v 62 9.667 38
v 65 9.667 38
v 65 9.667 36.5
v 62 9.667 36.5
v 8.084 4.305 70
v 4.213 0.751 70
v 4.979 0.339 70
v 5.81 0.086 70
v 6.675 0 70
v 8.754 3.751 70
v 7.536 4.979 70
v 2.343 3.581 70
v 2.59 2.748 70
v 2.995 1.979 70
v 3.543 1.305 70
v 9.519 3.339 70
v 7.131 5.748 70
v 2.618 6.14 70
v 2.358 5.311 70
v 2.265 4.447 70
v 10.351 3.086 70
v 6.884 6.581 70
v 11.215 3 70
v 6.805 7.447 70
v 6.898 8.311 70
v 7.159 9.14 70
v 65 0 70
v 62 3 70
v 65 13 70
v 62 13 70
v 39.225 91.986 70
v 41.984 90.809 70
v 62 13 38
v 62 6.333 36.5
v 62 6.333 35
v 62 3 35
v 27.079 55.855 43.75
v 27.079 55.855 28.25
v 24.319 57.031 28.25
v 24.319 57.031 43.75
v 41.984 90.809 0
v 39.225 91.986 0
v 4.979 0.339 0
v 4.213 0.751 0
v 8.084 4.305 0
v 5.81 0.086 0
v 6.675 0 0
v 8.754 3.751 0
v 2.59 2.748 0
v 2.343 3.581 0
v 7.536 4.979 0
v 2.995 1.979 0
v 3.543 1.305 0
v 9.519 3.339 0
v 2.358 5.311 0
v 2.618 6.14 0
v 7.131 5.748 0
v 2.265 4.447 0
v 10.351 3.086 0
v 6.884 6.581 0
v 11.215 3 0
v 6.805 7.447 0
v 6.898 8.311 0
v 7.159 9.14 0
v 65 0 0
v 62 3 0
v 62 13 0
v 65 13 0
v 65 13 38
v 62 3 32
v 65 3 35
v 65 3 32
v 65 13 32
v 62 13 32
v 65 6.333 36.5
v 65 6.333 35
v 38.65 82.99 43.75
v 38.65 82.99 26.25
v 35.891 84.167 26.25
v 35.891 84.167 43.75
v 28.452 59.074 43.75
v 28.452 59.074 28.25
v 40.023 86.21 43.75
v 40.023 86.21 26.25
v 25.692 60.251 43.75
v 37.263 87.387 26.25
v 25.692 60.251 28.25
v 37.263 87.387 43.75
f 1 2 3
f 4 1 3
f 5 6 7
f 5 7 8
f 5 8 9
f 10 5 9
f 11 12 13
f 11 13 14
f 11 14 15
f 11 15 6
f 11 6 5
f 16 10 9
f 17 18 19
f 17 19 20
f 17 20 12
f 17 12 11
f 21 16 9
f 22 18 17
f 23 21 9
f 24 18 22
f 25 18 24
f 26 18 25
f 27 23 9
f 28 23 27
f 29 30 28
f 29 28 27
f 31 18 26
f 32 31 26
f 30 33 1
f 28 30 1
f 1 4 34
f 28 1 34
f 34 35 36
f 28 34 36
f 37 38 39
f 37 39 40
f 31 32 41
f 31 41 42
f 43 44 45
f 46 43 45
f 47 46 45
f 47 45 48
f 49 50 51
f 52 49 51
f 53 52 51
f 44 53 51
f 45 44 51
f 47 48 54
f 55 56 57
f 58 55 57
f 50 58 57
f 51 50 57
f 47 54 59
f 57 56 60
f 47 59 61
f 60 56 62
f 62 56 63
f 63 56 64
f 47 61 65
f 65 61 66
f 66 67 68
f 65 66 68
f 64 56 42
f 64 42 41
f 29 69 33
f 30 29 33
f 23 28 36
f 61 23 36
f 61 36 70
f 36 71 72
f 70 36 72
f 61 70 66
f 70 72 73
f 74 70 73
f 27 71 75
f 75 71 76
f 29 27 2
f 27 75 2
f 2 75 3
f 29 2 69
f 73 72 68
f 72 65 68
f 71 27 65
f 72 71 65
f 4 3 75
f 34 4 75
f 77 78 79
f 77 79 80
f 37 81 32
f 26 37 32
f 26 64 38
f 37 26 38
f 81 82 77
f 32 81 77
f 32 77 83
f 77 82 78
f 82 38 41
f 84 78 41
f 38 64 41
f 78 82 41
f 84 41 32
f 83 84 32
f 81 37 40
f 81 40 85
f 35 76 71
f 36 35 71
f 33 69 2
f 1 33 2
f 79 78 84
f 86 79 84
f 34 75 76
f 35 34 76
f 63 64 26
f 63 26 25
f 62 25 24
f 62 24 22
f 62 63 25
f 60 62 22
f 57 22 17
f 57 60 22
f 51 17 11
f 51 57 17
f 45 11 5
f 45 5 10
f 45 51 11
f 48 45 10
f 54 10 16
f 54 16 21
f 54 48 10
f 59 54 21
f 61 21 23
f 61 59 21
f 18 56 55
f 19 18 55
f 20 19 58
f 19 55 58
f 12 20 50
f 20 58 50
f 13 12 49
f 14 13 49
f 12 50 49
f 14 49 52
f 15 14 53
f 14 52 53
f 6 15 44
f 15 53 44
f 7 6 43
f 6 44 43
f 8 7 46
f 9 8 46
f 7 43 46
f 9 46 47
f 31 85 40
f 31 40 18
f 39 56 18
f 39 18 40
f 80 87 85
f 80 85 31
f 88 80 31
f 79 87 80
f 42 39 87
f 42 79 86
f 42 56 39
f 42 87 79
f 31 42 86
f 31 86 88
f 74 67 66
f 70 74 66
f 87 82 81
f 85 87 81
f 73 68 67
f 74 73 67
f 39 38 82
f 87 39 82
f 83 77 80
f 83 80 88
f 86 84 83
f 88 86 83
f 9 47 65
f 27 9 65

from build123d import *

# Parameters (mm, degrees)
PAD_DEPTH       = 70
SKETCH001_W     = 3.5
SKETCH001_H     = 17.5
SKETCH001_H_2   = 15.5
POCKET_DEPTH    = 36.998994
POCKET001_DEPTH = 5


with BuildPart() as part:
    # Sketch → Pad (new body)
    with BuildSketch(Plane.XY):
        with BuildLine():
            Line((6.674721, 0), (65, 0))
            Line((65, 0), (65, 3))
            Line((65, 3), (65, 13))
            Line((65, 13), (62, 13))
            Line((62, 13), (62, 3))
            Line((62, 3), (11.215347, 3))
            ThreePointArc((7.158765, 9.139809), (7.535908, 4.978987), (11.215347, 3))
            Line((7.158765, 9.139809), (41.984267, 90.809258))
            Line((41.984267, 90.809258), (39.224687, 91.985998))
            Line((2.618138, 6.139809), (39.224687, 91.985998))
            ThreePointArc((2.618138, 6.139809), (2.995281, 1.978987), (6.674721, 0))
        make_face()
    extrude(amount=PAD_DEPTH)

    # Sketch001 (on Face9 of Pad) → Pocket (cut, through all)
    with BuildSketch(Plane(origin=(2.75958, -1.176741, 0), x_dir=(0.392247, 0.91986, 0), z_dir=(0.91986, -0.392247, 0))):
        with Locations((93.25, 35)):
            Rectangle(SKETCH001_W, SKETCH001_H)
        with Locations((63.75, 36)):
            Rectangle(SKETCH001_W, SKETCH001_H_2)
    extrude(amount=-POCKET_DEPTH, mode=Mode.SUBTRACT)

    # Sketch002 (on Face16 of Pocket) → Pocket001 (cut)
    with BuildSketch(Plane.YZ.offset(65)):
        Polygon((3, 35), (3, 32), (13, 32), (13, 38), (9.666667, 38), (9.666667, 36.5), (6.333333, 36.5), (6.333333, 35), align=None)
    extrude(amount=-POCKET001_DEPTH, mode=Mode.SUBTRACT)


solid = part.part
